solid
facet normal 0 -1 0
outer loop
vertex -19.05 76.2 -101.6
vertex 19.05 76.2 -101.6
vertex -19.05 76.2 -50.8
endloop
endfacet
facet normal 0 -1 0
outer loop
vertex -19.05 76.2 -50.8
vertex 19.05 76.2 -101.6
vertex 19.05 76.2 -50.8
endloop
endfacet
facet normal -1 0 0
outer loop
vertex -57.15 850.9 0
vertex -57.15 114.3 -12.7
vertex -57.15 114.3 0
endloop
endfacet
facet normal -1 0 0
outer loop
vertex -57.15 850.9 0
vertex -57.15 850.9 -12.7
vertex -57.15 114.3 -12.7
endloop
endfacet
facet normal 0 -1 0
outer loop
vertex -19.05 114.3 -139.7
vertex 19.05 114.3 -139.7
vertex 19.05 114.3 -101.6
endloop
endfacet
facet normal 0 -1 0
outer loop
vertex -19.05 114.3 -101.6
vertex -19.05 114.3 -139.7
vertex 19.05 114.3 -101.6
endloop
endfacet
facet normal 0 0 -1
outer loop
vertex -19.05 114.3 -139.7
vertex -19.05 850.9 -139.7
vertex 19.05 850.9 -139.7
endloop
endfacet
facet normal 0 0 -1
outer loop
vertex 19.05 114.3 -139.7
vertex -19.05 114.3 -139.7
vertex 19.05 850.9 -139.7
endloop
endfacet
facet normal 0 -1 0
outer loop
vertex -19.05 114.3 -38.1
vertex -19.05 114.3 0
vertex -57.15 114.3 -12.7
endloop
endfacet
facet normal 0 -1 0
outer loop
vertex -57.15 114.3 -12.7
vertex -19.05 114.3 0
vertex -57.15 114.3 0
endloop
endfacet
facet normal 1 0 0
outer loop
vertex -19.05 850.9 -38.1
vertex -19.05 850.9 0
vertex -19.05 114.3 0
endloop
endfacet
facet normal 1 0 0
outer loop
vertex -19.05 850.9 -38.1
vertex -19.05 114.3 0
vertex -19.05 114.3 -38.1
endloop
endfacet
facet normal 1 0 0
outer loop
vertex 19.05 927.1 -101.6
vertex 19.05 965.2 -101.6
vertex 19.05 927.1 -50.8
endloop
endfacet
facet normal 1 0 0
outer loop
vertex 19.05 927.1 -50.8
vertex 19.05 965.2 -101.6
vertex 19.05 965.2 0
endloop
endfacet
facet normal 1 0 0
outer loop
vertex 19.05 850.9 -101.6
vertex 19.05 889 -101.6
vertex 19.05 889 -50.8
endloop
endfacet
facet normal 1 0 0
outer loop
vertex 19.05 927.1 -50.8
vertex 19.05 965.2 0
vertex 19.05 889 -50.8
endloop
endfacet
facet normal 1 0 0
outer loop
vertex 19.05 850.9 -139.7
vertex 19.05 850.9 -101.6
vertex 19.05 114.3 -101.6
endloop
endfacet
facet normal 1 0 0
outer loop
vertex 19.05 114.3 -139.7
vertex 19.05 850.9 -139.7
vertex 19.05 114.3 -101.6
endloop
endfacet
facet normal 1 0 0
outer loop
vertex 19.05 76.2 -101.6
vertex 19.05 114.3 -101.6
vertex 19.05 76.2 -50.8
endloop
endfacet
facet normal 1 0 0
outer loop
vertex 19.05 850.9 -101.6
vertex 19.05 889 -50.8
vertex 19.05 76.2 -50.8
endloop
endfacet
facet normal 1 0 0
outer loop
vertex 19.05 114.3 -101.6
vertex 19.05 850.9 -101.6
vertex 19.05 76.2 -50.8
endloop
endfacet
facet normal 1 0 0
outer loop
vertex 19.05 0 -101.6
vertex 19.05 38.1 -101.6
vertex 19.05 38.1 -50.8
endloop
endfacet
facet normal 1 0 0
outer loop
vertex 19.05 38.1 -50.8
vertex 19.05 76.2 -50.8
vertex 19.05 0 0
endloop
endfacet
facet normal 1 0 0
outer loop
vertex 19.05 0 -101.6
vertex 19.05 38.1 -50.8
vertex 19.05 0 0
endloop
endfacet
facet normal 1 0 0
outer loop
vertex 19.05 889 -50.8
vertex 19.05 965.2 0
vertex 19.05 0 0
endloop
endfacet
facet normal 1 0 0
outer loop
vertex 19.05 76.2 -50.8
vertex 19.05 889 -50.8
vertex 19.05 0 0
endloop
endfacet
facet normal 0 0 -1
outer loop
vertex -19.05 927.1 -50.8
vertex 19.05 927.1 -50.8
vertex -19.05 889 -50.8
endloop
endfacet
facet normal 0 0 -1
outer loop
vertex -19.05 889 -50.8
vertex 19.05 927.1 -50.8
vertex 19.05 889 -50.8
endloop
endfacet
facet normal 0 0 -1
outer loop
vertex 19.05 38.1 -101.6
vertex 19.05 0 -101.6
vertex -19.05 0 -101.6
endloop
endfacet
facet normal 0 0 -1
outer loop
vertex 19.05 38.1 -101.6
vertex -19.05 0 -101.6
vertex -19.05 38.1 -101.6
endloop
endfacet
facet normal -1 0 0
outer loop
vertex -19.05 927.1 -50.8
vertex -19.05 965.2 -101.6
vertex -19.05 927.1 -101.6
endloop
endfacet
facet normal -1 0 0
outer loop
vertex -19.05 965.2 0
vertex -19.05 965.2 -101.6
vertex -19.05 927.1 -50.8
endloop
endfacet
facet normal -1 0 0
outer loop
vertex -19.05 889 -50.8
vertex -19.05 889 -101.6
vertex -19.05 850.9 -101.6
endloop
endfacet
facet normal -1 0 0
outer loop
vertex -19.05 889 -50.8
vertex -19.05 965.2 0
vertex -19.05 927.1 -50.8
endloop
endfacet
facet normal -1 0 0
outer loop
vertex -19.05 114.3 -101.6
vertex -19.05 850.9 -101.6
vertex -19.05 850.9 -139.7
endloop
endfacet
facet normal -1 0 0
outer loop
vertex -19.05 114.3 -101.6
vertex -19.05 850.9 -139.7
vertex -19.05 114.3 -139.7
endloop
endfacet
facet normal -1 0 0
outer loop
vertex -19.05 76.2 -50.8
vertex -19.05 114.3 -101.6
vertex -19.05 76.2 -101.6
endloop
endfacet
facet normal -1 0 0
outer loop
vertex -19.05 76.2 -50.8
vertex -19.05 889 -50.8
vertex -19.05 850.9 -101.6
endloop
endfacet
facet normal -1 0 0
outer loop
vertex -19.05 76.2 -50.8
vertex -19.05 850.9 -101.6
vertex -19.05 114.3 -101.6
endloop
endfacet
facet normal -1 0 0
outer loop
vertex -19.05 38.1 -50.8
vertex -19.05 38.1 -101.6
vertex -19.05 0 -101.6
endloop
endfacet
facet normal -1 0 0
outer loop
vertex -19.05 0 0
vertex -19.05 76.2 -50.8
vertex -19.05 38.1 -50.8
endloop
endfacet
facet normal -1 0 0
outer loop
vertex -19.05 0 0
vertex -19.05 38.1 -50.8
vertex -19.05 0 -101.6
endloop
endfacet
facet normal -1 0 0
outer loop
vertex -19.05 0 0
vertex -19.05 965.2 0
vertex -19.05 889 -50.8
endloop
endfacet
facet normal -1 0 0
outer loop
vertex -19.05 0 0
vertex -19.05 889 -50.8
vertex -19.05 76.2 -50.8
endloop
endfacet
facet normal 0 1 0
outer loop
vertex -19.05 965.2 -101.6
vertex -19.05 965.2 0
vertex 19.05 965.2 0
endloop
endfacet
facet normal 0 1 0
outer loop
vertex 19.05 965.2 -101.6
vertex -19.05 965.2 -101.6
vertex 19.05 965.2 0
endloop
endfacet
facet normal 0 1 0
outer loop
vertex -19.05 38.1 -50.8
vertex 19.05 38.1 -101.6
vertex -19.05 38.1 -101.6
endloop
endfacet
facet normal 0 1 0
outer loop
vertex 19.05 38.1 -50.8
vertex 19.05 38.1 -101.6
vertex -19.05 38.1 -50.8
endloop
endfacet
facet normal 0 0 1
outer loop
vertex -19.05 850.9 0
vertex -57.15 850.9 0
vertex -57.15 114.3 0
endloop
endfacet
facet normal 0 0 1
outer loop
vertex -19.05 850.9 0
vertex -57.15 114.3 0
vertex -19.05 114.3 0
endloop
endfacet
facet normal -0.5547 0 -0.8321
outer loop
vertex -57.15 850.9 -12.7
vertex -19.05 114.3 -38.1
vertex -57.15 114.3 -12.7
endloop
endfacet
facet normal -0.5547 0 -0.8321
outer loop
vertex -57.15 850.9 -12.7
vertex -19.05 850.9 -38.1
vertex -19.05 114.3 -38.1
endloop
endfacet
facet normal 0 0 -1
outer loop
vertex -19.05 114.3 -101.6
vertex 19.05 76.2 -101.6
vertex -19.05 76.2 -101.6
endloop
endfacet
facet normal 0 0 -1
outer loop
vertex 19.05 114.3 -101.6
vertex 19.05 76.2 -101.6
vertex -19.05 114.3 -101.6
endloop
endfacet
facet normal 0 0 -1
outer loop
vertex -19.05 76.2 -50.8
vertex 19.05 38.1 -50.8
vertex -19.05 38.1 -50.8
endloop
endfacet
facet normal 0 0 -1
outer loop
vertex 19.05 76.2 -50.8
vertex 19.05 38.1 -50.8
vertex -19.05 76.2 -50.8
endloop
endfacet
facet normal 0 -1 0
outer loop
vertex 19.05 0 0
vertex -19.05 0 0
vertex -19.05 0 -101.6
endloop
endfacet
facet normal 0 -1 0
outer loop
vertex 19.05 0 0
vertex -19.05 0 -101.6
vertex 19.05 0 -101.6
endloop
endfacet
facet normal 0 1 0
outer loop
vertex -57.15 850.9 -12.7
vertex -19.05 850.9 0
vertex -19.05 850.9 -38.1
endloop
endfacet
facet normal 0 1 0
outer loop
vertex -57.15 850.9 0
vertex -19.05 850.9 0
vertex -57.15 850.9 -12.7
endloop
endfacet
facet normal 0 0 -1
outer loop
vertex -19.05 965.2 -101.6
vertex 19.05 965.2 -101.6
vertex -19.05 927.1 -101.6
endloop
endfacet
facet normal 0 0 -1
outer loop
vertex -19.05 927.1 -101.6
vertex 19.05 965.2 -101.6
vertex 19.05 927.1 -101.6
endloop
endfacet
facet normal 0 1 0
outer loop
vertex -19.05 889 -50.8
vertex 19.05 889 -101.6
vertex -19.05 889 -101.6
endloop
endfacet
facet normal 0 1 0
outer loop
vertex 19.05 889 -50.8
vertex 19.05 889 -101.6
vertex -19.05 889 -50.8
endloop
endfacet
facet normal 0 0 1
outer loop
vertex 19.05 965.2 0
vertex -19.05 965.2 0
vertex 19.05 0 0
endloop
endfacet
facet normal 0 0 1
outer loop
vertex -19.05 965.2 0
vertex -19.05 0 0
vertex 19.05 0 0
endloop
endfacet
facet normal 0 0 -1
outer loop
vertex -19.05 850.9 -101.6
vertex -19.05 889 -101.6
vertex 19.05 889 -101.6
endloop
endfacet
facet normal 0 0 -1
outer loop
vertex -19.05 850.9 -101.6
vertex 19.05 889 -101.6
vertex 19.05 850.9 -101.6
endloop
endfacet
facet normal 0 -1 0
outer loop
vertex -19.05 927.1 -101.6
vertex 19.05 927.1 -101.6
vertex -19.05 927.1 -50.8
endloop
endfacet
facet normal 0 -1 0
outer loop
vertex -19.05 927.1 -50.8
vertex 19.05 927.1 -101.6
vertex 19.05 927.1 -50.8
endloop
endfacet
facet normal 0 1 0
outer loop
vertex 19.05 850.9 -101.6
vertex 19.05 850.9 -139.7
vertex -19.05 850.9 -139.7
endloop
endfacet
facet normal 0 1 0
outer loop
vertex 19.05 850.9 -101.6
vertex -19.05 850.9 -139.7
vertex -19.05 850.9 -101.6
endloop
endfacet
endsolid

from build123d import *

# Parameters (mm, degrees)
F0_W          = 38.1
F0_H          = 482.6
F1_DEPTH      = 139.7
F2_W          = 114.3
F2_H          = 38.1
F3_DEPTH      = 38.101
F4_W          = 38.1
F4_H          = 50.8
F5_DEPTH      = 38.101
F9_DEPTH      = 368.3
F9_DEPTH_BACK = 368.3


# Not quite as in the source:
# - a feature names something its author has since deleted; it is built from what else it names


with BuildPart() as f1:
    # F0 (on Top) → F1 (new body)
    with BuildSketch(Plane.XY):
        with Locations((0, 241.3)):
            Rectangle(F0_W, F0_H)
    extrude(amount=-F1_DEPTH)

    # F2 (on face) → F3 (cut, through all)
    with BuildSketch(Plane.YZ.offset(19.05)):
        with Locations((57.15, -120.65)):
            Rectangle(F2_W, F2_H)
    extrude(amount=-F3_DEPTH, mode=Mode.SUBTRACT)

    # F4 (on face) → F5 (cut, through all)
    with BuildSketch(Plane.YZ.offset(19.05)):
        with Locations((57.15, -76.2)):
            Rectangle(F4_W, F4_H)
    extrude(amount=-F5_DEPTH, mode=Mode.SUBTRACT)

    # F7: F1 across plane


with BuildPart() as f1_1:
    add(f1.part)
    add(f1.part.mirror(Plane(origin=(0, 482.6, -69.85), x_dir=(-1, 0, 0), z_dir=(0, 1, 0))))


with BuildPart() as f9:
    # F8 (on offset) → F9 (new body, two sides)
    with BuildSketch(Plane(origin=(0, 482.6, 0), x_dir=(-1, 0, 0), z_dir=(0, 1, 0))) as f9_sk:
        Polygon((57.15, -12.7), (57.15, 0), (19.05, 0), (19.05, -38.1), align=None)
    extrude(amount=F9_DEPTH)
    extrude(f9_sk.sketch, amount=-F9_DEPTH_BACK)


solid = Compound([f1_1.part, f9.part])
